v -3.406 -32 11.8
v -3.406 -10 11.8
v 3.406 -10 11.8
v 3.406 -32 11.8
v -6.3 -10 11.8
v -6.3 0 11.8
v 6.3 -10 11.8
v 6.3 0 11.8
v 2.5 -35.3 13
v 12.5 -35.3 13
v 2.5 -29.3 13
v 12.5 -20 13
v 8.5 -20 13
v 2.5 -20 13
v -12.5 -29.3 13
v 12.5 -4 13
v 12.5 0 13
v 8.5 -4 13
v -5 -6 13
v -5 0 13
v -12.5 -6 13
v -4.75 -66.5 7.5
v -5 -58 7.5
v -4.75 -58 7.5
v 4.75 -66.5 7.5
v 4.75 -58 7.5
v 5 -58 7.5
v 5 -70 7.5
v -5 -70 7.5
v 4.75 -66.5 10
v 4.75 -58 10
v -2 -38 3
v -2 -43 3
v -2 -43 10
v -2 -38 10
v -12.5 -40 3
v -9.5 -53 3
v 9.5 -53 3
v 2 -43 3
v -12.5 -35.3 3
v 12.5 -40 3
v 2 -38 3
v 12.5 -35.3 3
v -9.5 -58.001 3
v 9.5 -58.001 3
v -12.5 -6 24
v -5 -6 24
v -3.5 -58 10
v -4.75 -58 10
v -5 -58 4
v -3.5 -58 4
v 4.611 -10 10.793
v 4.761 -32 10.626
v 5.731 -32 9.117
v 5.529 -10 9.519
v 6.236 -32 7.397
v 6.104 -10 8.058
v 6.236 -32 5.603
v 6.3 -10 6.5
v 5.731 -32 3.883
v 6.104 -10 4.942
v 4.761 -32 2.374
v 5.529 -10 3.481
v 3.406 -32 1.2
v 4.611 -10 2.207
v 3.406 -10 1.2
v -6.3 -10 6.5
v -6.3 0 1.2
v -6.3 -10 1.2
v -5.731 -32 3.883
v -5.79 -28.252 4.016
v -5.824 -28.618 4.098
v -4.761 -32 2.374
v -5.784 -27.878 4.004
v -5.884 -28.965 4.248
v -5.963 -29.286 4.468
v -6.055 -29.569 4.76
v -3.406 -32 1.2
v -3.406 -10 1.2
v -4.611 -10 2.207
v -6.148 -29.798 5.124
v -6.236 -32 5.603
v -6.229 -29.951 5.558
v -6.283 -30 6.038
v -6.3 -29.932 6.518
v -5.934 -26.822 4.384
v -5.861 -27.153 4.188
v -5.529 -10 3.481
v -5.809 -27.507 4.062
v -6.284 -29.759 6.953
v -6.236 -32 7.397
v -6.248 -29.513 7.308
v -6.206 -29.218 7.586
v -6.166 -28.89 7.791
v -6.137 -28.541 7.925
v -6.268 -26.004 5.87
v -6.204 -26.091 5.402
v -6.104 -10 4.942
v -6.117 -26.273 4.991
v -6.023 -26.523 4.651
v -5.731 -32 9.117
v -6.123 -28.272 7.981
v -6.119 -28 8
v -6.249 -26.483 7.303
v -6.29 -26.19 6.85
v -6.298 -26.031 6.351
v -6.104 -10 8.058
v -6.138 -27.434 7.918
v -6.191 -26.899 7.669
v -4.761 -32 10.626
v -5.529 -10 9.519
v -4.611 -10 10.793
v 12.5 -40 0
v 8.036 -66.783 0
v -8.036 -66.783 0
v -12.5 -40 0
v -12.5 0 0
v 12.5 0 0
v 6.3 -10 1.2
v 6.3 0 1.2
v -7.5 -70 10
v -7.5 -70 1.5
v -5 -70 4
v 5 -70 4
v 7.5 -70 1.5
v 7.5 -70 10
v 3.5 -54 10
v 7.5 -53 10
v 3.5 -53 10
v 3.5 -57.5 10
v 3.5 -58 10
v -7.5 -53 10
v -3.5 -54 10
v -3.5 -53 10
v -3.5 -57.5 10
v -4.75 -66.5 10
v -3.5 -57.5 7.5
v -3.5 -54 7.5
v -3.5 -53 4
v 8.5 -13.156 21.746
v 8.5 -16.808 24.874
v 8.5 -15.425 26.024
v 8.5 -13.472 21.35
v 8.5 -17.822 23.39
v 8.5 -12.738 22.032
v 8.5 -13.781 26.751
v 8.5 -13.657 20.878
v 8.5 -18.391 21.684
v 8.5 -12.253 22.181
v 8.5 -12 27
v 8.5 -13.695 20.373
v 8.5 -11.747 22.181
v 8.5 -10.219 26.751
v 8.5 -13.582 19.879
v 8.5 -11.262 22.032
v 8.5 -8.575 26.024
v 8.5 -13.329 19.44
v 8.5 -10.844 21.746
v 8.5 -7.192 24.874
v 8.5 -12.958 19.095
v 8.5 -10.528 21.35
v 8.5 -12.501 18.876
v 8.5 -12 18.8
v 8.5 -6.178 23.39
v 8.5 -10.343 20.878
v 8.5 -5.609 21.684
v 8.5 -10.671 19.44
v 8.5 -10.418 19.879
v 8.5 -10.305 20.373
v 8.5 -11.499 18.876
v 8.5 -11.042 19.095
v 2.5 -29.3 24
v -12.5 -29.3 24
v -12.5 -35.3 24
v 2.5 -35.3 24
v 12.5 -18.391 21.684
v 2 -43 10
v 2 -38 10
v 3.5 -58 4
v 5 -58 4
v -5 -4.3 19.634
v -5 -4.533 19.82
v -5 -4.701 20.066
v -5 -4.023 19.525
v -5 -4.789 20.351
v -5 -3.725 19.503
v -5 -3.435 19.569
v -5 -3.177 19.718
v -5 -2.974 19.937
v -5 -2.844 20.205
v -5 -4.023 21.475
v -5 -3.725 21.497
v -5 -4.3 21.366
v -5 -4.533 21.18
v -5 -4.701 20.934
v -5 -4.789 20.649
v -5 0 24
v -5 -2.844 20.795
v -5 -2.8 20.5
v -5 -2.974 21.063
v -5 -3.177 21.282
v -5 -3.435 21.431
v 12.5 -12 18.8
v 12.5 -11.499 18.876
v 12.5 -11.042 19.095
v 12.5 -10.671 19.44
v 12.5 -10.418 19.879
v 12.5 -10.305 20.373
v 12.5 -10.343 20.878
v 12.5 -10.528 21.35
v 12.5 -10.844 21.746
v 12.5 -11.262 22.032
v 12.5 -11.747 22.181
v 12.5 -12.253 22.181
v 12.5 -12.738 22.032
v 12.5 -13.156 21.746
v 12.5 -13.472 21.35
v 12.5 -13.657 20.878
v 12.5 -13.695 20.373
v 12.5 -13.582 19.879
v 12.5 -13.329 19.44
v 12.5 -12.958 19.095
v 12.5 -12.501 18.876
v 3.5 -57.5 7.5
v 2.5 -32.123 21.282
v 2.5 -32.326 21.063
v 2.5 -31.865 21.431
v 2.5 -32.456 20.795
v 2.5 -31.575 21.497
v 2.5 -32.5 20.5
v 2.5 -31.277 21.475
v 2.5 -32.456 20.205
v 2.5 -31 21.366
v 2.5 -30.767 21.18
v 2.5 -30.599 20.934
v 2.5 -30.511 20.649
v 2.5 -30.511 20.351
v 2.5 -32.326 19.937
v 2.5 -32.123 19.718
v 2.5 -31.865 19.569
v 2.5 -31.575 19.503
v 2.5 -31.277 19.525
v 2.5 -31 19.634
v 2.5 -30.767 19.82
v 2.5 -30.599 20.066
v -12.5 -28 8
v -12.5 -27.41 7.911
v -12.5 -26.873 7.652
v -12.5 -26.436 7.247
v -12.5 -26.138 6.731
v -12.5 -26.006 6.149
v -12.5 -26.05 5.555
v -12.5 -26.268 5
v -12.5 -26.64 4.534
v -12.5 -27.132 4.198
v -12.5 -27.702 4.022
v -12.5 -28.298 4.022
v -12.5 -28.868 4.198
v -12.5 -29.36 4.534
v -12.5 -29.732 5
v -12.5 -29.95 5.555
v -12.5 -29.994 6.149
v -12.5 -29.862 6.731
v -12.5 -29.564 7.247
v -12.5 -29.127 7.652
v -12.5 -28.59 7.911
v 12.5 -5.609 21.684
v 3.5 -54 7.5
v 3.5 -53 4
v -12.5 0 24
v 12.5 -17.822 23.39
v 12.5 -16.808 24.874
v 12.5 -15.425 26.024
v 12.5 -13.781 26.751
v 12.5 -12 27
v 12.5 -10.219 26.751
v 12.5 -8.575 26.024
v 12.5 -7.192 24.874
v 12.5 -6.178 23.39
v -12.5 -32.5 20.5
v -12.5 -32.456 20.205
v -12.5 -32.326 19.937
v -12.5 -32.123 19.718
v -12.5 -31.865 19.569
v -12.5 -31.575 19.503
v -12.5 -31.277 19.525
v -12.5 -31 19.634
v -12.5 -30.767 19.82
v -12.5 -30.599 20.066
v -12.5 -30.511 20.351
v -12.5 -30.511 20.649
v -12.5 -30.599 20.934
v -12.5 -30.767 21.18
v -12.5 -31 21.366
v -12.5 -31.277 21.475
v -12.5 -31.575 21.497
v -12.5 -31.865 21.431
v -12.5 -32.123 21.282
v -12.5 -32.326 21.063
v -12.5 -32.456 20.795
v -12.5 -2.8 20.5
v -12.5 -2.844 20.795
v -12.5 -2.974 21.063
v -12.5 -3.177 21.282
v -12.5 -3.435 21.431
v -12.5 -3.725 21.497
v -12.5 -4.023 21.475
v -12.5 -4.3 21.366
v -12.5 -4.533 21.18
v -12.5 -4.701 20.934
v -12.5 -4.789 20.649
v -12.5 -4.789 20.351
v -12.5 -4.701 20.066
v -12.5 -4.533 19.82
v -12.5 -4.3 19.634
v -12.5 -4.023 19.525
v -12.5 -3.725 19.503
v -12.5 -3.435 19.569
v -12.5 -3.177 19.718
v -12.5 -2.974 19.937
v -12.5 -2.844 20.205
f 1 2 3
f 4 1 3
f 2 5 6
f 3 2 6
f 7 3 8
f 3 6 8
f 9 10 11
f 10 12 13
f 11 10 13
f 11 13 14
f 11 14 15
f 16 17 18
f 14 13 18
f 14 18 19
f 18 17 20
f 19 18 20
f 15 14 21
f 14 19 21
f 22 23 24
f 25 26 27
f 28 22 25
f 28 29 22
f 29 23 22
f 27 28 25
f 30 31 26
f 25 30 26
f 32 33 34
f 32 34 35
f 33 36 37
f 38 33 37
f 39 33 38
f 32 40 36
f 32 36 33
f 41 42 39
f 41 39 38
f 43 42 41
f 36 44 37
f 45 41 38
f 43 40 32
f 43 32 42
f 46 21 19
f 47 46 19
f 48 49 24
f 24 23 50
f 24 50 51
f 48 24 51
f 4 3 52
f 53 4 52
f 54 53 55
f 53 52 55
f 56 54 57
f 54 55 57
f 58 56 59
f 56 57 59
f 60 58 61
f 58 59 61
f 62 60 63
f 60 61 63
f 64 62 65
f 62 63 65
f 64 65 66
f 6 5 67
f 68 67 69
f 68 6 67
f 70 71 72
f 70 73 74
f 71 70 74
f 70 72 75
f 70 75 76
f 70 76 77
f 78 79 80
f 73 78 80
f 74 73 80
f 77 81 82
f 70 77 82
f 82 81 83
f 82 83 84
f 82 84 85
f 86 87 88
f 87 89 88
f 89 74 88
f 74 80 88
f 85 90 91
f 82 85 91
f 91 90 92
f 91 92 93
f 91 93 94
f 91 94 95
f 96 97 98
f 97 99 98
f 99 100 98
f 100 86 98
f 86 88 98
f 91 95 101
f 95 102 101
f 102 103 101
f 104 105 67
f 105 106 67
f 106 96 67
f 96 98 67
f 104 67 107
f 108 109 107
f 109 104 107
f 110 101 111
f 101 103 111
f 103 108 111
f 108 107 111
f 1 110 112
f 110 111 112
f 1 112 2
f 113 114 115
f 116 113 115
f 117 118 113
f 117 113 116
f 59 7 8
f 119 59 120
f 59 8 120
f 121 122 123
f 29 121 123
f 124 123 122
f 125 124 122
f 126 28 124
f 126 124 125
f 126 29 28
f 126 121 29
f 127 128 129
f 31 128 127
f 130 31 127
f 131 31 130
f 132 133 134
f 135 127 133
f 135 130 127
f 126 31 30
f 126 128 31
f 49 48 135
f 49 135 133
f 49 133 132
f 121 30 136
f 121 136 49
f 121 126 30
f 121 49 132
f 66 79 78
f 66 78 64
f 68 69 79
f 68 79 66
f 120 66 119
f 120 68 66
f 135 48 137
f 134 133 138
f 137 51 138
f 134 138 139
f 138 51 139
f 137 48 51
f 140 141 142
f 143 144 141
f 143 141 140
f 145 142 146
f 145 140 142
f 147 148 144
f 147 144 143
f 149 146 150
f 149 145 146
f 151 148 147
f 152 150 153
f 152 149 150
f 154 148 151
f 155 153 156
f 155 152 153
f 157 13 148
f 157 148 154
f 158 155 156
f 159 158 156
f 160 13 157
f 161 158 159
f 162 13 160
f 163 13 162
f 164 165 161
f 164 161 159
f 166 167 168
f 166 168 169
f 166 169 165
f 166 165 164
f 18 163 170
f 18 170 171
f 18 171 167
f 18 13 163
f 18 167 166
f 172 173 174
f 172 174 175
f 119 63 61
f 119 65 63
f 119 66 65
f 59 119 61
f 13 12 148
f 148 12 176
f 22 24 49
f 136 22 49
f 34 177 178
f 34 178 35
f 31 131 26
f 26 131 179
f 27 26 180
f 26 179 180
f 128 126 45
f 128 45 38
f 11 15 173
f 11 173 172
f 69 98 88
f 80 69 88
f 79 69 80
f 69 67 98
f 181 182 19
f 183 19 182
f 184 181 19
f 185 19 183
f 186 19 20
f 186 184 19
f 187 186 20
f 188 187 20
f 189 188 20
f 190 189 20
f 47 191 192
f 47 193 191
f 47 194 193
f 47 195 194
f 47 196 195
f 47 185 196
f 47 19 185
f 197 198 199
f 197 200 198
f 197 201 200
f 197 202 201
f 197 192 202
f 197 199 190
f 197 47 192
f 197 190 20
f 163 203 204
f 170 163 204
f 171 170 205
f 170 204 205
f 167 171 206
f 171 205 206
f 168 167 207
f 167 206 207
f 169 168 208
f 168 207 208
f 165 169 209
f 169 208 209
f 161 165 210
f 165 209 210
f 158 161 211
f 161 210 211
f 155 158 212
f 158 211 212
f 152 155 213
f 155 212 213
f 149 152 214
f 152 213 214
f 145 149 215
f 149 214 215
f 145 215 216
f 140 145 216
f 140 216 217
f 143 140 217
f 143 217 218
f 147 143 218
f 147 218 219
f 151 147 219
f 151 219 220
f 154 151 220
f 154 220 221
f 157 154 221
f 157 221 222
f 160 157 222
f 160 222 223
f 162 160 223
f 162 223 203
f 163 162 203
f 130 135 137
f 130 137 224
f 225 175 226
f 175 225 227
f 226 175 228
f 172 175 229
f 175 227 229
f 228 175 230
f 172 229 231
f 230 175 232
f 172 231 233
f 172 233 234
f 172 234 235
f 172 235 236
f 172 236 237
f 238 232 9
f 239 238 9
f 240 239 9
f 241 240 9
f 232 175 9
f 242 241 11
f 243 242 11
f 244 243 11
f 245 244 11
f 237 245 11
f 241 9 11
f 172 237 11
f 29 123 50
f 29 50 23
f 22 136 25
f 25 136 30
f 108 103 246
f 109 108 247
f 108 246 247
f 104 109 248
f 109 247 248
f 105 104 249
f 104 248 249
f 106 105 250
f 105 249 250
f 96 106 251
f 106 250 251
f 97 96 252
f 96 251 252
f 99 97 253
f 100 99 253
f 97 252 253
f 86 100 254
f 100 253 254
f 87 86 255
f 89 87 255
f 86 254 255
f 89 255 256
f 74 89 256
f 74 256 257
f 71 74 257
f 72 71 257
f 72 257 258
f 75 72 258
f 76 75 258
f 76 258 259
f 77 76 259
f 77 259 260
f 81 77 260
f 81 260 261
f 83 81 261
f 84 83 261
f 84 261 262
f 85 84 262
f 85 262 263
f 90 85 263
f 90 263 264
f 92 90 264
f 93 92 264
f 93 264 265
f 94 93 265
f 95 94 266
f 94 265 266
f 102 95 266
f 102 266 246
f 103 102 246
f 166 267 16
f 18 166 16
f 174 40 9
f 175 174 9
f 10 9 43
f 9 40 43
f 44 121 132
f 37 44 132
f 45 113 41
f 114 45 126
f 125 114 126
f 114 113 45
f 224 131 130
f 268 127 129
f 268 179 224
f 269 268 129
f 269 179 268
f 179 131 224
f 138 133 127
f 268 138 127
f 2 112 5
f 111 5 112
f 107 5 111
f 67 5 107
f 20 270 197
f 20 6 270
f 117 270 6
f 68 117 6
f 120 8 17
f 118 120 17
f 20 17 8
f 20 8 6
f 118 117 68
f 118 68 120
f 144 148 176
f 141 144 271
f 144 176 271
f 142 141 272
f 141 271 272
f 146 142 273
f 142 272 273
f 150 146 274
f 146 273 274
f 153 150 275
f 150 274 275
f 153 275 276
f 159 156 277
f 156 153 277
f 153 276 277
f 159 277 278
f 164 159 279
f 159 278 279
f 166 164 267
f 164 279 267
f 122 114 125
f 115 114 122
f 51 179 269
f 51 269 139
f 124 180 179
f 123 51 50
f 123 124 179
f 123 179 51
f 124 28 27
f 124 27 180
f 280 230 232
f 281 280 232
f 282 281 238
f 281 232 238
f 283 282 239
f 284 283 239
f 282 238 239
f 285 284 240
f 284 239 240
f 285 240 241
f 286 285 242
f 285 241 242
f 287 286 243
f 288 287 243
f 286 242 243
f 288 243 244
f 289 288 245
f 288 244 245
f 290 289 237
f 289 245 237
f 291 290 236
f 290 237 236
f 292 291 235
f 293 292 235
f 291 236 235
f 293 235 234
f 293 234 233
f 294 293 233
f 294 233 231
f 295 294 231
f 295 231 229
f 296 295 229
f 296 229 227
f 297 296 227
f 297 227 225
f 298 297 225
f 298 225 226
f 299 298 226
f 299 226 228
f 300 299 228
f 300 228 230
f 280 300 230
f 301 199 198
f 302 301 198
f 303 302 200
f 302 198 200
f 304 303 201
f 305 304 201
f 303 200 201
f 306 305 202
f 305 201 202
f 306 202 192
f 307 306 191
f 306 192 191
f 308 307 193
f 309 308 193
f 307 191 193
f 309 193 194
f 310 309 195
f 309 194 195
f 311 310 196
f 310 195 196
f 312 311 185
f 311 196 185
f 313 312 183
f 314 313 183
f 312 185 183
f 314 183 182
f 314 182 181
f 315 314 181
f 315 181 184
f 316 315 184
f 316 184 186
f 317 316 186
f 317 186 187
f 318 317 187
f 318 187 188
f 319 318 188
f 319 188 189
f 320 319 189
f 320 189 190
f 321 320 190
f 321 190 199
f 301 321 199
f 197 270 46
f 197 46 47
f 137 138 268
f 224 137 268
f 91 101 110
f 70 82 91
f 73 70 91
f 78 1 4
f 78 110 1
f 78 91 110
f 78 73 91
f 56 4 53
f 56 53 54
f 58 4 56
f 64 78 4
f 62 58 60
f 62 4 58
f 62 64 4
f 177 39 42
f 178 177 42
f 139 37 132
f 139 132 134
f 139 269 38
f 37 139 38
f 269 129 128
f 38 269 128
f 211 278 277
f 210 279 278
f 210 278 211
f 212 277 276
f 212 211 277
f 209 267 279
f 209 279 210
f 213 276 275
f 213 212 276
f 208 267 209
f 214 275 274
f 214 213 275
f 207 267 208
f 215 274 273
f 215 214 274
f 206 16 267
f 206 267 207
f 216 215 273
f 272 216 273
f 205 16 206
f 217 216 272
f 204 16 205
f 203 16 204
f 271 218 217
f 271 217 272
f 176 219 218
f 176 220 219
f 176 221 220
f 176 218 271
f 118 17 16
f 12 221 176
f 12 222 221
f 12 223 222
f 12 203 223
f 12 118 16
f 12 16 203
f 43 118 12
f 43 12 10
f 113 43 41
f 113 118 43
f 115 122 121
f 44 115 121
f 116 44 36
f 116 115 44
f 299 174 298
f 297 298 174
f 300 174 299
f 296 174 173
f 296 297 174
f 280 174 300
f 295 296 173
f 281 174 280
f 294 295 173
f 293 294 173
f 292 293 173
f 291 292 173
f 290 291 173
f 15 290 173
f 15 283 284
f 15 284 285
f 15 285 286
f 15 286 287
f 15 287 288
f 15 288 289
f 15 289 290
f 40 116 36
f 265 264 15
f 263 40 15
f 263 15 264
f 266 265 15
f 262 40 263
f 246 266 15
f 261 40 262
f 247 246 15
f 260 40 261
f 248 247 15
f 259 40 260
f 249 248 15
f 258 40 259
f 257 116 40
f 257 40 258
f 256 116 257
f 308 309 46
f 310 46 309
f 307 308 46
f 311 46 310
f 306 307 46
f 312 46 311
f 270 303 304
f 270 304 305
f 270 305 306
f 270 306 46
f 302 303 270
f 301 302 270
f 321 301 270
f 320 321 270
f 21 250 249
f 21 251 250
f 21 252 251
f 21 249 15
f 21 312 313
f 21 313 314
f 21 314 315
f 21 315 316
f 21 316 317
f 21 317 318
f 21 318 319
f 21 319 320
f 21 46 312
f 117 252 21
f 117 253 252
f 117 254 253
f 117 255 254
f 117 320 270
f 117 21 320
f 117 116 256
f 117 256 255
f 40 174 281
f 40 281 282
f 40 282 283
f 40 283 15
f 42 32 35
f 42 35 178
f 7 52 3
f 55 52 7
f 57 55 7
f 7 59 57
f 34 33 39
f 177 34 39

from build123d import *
from OCP.BRepFilletAPI import BRepFilletAPI_MakeChamfer

# Parameters (mm, degrees)
RESSALTO_EXTRUS_O1_DEPTH = 13
ESBO_O2_W                = 15
ESBO_O2_H                = 6
ESBO_O2_W_2              = 4
ESBO_O2_H_2              = 16
RESSALTO_EXTRUS_O2_DEPTH = 15
ESBO_O3_R                = 1
CORTE_EXTRUS_O1_DEPTH    = 77.870020164
ESBO_O10_R               = 1.7
CORTE_EXTRUS_O4_DEPTH    = 10
ESBO_O11_W               = 25
ESBO_O11_H               = 34.7
CORTE_EXTRUS_O5_DEPTH    = 10
RESSALTO_EXTRUS_O3_DEPTH = 17
RESSALTO_EXTRUS_O4_REACH = 77.374
ESBO_O7_W                = 4
ESBO_O7_H                = 5
ESBO_O8_W                = 15
ESBO_O8_H                = 3.5
RESSALTO_EXTRUS_O5_DEPTH = 2.5
CHANFRO2_SIZE            = 2
CHANFRO2_SIZE_2          = 7
CHANFRO3_SIZE            = 1.5
CHANFRO3_SIZE2           = 3.216760381
ESBO_O12_W               = 12.6
ESBO_O12_H               = 10.6
CORTE_EXTRUS_O6_DEPTH    = 10
CORTE_EXTRUS_O7_DEPTH    = 22
ESBO_O15_R               = 2
CORTE_EXTRUS_O9_DEPTH    = 15
ESBO_O17_W               = 15
ESBO_O17_H               = 35.3
CORTE_EXTRUS_O10_DEPTH   = 4
ESBO_O18_W               = 7.5
ESBO_O18_H               = 6
CORTE_EXTRUS_O11_DEPTH   = 11


with BuildPart() as part:
    # Esboço1 → Ressalto-extrusão1 (new body)
    with BuildSketch(Plane.XY):
        Polygon((-12.5, 0), (12.5, 0), (12.5, -40), (7.5, -70), (-7.5, -70), (-12.5, -40), align=None)
    extrude(amount=RESSALTO_EXTRUS_O1_DEPTH)

    # Esboço2 → Ressalto-extrusão2 (add)
    with BuildSketch(Plane.XY.offset(13)):
        with Locations((-5, -32.3)):
            Rectangle(ESBO_O2_W, ESBO_O2_H)
        with Locations((-5, -3)):
            Rectangle(ESBO_O2_W, ESBO_O2_H)
        with Locations((10.5, -12)):
            Rectangle(ESBO_O2_W_2, ESBO_O2_H_2)
    extrude(amount=RESSALTO_EXTRUS_O2_DEPTH)

    # Esboço3 → Corte-extrusão1 (cut, through all)
    with BuildSketch(Plane(origin=(2.5, 0, 0), x_dir=(0, 0, -1), z_dir=(1, 0, 0))):
        with Locations(Location((-20.5, -3.8, 0), (0, 0, 90))):
            Circle(ESBO_O3_R)
        with Locations(Location((-20.5, -31.5, 0), (0, 0, 270))):
            Circle(ESBO_O3_R)
    extrude(amount=-CORTE_EXTRUS_O1_DEPTH, mode=Mode.SUBTRACT)

    # Esboço10 → Corte-extrusão4 (cut)
    with BuildSketch(Plane(origin=(12.5, 0, 0), x_dir=(0, 0, -1), z_dir=(1, 0, 0))):
        with Locations((-20.5, -12)):
            Circle(ESBO_O10_R)
        with BuildLine():
            Line((-13, -4), (-28, -4))
            Line((-28, -4), (-28, -20))
            Line((-28, -20), (-13, -20))
            Line((-13, -20), (-21.684004699, -18.391254405))
            ThreePointArc((-21.684004699, -18.391254405), (-27, -12), (-21.684004699, -5.608745595))
            Line((-21.684004699, -5.608745595), (-13, -4))
        make_face()
    extrude(amount=-CORTE_EXTRUS_O4_DEPTH, mode=Mode.SUBTRACT)

    # Esboço11 → Corte-extrusão5 (cut)
    with BuildSketch(Plane.XY.offset(13)):
        with Locations((0, -52.65)):
            Rectangle(ESBO_O11_W, ESBO_O11_H)
    extrude(amount=-CORTE_EXTRUS_O5_DEPTH, mode=Mode.SUBTRACT)

    # Esboço6 → Ressalto-extrusão3 (add)
    with BuildSketch(Plane.XZ.offset(70)):
        Polygon((-5, 4), (-5, 7.5), (-4.75, 7.5), (-4.75, 10), (-7.5, 10), (-7.5, 3), (7.5, 3), (7.5, 10), (4.75, 10), (4.75, 7.5), (5, 7.5), (5, 4), align=None)
    extrude(amount=-RESSALTO_EXTRUS_O3_DEPTH)

    # Ressalto-extrusão4: up to this face of the body (flat: up to its plane)
    ressalto_extrus_o4_end = Plane(part.part.faces().sort_by_distance((-6.125, -61.5, 10))[0])
    # Esboço7 → Ressalto-extrusão4 (add, up to the picked face)
    with BuildSketch(Plane.XY.offset(3), mode=Mode.PRIVATE) as ressalto_extrus_o4_sk1:
        with Locations((0, -40.5)):
            Rectangle(ESBO_O7_W, ESBO_O7_H)
    ressalto_extrus_o4_tool1 = split(extrude(ressalto_extrus_o4_sk1.sketch, amount=RESSALTO_EXTRUS_O4_REACH, mode=Mode.PRIVATE), bisect_by=ressalto_extrus_o4_end, keep=Keep.BOTH, mode=Mode.PRIVATE)
    # Esboço7 → Ressalto-extrusão4 (add, up to the picked face)
    with BuildSketch(Plane.XY.offset(3), mode=Mode.PRIVATE) as ressalto_extrus_o4_sk2:
        with Locations((5.5, -55.5)):
            Rectangle(ESBO_O7_W, ESBO_O7_H)
    ressalto_extrus_o4_tool2 = split(extrude(ressalto_extrus_o4_sk2.sketch, amount=RESSALTO_EXTRUS_O4_REACH, mode=Mode.PRIVATE), bisect_by=ressalto_extrus_o4_end, keep=Keep.BOTH, mode=Mode.PRIVATE)
    # Esboço7 → Ressalto-extrusão4 (add, up to the picked face)
    with BuildSketch(Plane.XY.offset(3), mode=Mode.PRIVATE) as ressalto_extrus_o4_sk3:
        with Locations((-5.5, -55.5)):
            Rectangle(ESBO_O7_W, ESBO_O7_H)
    ressalto_extrus_o4_tool3 = split(extrude(ressalto_extrus_o4_sk3.sketch, amount=RESSALTO_EXTRUS_O4_REACH, mode=Mode.PRIVATE), bisect_by=ressalto_extrus_o4_end, keep=Keep.BOTH, mode=Mode.PRIVATE)
    add(ressalto_extrus_o4_tool1.solids().sort_by(Axis((0, -40.5, 3), (0, 0, 1)))[0])
    add(ressalto_extrus_o4_tool2.solids().sort_by(Axis((5.5, -55.5, 3), (0, 0, 1)))[0])
    add(ressalto_extrus_o4_tool3.solids().sort_by(Axis((-5.5, -55.5, 3), (0, 0, 1)))[0])

    # Esboço8 → Ressalto-extrusão5 (add)
    with BuildSketch(Plane.XY.offset(10)):
        with Locations((0, -68.25)):
            Rectangle(ESBO_O8_W, ESBO_O8_H)
        with Locations((0, -55.75)):
            Rectangle(ESBO_O8_W, ESBO_O8_H)
    extrude(amount=-RESSALTO_EXTRUS_O5_DEPTH)

    # Chanfro2
    chanfro2_edges_1 = [part.edges().sort_by_distance(p)[0] for p in [
        (7.5, -61.5, 3),
    ]]
    chanfro2_side_1 = [part.faces().sort_by_distance(p)[0] for p in [
        (7.54, -61.5, 3),
    ]]
    chanfro2_edges_2 = [part.edges().sort_by_distance(p)[0] for p in [
        (-7.5, -61.5, 3),
    ]]
    chanfro2_side_2 = [part.faces().sort_by_distance(p)[0] for p in [
        (-7.54, -61.5, 3),
    ]]
    chanfro2 = BRepFilletAPI_MakeChamfer(part.part.solid().wrapped)
    for e in chanfro2_edges_1:
        chanfro2.Add(CHANFRO2_SIZE - 0.0001, CHANFRO2_SIZE_2 - 0.0001, e.wrapped, chanfro2_side_1[0].wrapped)
    for e in chanfro2_edges_2:
        chanfro2.Add(CHANFRO2_SIZE - 0.0001, CHANFRO2_SIZE_2 - 0.0001, e.wrapped, chanfro2_side_2[0].wrapped)
    add(Compound.cast(chanfro2.Shape()), mode=Mode.REPLACE)  # a hair under: the kernel refuses the full size

    # Chanfro3
    chanfro3_edges = [part.edges().sort_by_distance(p)[0] for p in [
        (0, -70, 0),
    ]]
    chanfro3_side = [part.faces().sort_by_distance(p)[0] for p in [
        (7.319722436, -70, 9.99995),
    ]]
    chamfer(chanfro3_edges, length=CHANFRO3_SIZE, length2=CHANFRO3_SIZE2, reference=chanfro3_side[0])

    # Esboço12 → Corte-extrusão6 (cut)
    with BuildSketch(Plane(origin=(0, 0, 0), x_dir=(1, 0, 0), z_dir=(0, 1, 0))):
        with Locations((0, -6.5)):
            Rectangle(ESBO_O12_W, ESBO_O12_H)
    extrude(amount=-CORTE_EXTRUS_O6_DEPTH, mode=Mode.SUBTRACT)

    # Esboço13 → Corte-extrusão7 (cut)
    with BuildSketch(Plane(origin=(0, -10, 0), x_dir=(1, 0, 0), z_dir=(0, 1, 0))):
        with BuildLine():
            Line((-3.405877273, -11.8), (3.405877273, -11.8))
            ThreePointArc((3.405877273, -11.8), (6.3, -6.5), (3.405877273, -1.2))
            Line((3.405877273, -1.2), (-3.405877273, -1.2))
            ThreePointArc((-3.405877273, -1.2), (-6.3, -6.5), (-3.405877273, -11.8))
        make_face()
    extrude(amount=-CORTE_EXTRUS_O7_DEPTH, mode=Mode.SUBTRACT)

    # Esboço15 → Corte-extrusão9 (cut)
    with BuildSketch(Plane.ZY.offset(12.5)):
        with Locations((6, -28)):
            Circle(ESBO_O15_R)
    extrude(amount=-CORTE_EXTRUS_O9_DEPTH, mode=Mode.SUBTRACT)

    # Esboço17 → Corte-extrusão10 (cut)
    with BuildSketch(Plane.XY.offset(28)):
        with Locations((-5, -17.65)):
            Rectangle(ESBO_O17_W, ESBO_O17_H)
    extrude(amount=-CORTE_EXTRUS_O10_DEPTH, mode=Mode.SUBTRACT)

    # Esboço18 → Corte-extrusão11 (cut)
    with BuildSketch(Plane.XY.offset(24)):
        with Locations((-1.25, -3)):
            Rectangle(ESBO_O18_W, ESBO_O18_H)
    extrude(amount=-CORTE_EXTRUS_O11_DEPTH, mode=Mode.SUBTRACT)


solid = part.part
